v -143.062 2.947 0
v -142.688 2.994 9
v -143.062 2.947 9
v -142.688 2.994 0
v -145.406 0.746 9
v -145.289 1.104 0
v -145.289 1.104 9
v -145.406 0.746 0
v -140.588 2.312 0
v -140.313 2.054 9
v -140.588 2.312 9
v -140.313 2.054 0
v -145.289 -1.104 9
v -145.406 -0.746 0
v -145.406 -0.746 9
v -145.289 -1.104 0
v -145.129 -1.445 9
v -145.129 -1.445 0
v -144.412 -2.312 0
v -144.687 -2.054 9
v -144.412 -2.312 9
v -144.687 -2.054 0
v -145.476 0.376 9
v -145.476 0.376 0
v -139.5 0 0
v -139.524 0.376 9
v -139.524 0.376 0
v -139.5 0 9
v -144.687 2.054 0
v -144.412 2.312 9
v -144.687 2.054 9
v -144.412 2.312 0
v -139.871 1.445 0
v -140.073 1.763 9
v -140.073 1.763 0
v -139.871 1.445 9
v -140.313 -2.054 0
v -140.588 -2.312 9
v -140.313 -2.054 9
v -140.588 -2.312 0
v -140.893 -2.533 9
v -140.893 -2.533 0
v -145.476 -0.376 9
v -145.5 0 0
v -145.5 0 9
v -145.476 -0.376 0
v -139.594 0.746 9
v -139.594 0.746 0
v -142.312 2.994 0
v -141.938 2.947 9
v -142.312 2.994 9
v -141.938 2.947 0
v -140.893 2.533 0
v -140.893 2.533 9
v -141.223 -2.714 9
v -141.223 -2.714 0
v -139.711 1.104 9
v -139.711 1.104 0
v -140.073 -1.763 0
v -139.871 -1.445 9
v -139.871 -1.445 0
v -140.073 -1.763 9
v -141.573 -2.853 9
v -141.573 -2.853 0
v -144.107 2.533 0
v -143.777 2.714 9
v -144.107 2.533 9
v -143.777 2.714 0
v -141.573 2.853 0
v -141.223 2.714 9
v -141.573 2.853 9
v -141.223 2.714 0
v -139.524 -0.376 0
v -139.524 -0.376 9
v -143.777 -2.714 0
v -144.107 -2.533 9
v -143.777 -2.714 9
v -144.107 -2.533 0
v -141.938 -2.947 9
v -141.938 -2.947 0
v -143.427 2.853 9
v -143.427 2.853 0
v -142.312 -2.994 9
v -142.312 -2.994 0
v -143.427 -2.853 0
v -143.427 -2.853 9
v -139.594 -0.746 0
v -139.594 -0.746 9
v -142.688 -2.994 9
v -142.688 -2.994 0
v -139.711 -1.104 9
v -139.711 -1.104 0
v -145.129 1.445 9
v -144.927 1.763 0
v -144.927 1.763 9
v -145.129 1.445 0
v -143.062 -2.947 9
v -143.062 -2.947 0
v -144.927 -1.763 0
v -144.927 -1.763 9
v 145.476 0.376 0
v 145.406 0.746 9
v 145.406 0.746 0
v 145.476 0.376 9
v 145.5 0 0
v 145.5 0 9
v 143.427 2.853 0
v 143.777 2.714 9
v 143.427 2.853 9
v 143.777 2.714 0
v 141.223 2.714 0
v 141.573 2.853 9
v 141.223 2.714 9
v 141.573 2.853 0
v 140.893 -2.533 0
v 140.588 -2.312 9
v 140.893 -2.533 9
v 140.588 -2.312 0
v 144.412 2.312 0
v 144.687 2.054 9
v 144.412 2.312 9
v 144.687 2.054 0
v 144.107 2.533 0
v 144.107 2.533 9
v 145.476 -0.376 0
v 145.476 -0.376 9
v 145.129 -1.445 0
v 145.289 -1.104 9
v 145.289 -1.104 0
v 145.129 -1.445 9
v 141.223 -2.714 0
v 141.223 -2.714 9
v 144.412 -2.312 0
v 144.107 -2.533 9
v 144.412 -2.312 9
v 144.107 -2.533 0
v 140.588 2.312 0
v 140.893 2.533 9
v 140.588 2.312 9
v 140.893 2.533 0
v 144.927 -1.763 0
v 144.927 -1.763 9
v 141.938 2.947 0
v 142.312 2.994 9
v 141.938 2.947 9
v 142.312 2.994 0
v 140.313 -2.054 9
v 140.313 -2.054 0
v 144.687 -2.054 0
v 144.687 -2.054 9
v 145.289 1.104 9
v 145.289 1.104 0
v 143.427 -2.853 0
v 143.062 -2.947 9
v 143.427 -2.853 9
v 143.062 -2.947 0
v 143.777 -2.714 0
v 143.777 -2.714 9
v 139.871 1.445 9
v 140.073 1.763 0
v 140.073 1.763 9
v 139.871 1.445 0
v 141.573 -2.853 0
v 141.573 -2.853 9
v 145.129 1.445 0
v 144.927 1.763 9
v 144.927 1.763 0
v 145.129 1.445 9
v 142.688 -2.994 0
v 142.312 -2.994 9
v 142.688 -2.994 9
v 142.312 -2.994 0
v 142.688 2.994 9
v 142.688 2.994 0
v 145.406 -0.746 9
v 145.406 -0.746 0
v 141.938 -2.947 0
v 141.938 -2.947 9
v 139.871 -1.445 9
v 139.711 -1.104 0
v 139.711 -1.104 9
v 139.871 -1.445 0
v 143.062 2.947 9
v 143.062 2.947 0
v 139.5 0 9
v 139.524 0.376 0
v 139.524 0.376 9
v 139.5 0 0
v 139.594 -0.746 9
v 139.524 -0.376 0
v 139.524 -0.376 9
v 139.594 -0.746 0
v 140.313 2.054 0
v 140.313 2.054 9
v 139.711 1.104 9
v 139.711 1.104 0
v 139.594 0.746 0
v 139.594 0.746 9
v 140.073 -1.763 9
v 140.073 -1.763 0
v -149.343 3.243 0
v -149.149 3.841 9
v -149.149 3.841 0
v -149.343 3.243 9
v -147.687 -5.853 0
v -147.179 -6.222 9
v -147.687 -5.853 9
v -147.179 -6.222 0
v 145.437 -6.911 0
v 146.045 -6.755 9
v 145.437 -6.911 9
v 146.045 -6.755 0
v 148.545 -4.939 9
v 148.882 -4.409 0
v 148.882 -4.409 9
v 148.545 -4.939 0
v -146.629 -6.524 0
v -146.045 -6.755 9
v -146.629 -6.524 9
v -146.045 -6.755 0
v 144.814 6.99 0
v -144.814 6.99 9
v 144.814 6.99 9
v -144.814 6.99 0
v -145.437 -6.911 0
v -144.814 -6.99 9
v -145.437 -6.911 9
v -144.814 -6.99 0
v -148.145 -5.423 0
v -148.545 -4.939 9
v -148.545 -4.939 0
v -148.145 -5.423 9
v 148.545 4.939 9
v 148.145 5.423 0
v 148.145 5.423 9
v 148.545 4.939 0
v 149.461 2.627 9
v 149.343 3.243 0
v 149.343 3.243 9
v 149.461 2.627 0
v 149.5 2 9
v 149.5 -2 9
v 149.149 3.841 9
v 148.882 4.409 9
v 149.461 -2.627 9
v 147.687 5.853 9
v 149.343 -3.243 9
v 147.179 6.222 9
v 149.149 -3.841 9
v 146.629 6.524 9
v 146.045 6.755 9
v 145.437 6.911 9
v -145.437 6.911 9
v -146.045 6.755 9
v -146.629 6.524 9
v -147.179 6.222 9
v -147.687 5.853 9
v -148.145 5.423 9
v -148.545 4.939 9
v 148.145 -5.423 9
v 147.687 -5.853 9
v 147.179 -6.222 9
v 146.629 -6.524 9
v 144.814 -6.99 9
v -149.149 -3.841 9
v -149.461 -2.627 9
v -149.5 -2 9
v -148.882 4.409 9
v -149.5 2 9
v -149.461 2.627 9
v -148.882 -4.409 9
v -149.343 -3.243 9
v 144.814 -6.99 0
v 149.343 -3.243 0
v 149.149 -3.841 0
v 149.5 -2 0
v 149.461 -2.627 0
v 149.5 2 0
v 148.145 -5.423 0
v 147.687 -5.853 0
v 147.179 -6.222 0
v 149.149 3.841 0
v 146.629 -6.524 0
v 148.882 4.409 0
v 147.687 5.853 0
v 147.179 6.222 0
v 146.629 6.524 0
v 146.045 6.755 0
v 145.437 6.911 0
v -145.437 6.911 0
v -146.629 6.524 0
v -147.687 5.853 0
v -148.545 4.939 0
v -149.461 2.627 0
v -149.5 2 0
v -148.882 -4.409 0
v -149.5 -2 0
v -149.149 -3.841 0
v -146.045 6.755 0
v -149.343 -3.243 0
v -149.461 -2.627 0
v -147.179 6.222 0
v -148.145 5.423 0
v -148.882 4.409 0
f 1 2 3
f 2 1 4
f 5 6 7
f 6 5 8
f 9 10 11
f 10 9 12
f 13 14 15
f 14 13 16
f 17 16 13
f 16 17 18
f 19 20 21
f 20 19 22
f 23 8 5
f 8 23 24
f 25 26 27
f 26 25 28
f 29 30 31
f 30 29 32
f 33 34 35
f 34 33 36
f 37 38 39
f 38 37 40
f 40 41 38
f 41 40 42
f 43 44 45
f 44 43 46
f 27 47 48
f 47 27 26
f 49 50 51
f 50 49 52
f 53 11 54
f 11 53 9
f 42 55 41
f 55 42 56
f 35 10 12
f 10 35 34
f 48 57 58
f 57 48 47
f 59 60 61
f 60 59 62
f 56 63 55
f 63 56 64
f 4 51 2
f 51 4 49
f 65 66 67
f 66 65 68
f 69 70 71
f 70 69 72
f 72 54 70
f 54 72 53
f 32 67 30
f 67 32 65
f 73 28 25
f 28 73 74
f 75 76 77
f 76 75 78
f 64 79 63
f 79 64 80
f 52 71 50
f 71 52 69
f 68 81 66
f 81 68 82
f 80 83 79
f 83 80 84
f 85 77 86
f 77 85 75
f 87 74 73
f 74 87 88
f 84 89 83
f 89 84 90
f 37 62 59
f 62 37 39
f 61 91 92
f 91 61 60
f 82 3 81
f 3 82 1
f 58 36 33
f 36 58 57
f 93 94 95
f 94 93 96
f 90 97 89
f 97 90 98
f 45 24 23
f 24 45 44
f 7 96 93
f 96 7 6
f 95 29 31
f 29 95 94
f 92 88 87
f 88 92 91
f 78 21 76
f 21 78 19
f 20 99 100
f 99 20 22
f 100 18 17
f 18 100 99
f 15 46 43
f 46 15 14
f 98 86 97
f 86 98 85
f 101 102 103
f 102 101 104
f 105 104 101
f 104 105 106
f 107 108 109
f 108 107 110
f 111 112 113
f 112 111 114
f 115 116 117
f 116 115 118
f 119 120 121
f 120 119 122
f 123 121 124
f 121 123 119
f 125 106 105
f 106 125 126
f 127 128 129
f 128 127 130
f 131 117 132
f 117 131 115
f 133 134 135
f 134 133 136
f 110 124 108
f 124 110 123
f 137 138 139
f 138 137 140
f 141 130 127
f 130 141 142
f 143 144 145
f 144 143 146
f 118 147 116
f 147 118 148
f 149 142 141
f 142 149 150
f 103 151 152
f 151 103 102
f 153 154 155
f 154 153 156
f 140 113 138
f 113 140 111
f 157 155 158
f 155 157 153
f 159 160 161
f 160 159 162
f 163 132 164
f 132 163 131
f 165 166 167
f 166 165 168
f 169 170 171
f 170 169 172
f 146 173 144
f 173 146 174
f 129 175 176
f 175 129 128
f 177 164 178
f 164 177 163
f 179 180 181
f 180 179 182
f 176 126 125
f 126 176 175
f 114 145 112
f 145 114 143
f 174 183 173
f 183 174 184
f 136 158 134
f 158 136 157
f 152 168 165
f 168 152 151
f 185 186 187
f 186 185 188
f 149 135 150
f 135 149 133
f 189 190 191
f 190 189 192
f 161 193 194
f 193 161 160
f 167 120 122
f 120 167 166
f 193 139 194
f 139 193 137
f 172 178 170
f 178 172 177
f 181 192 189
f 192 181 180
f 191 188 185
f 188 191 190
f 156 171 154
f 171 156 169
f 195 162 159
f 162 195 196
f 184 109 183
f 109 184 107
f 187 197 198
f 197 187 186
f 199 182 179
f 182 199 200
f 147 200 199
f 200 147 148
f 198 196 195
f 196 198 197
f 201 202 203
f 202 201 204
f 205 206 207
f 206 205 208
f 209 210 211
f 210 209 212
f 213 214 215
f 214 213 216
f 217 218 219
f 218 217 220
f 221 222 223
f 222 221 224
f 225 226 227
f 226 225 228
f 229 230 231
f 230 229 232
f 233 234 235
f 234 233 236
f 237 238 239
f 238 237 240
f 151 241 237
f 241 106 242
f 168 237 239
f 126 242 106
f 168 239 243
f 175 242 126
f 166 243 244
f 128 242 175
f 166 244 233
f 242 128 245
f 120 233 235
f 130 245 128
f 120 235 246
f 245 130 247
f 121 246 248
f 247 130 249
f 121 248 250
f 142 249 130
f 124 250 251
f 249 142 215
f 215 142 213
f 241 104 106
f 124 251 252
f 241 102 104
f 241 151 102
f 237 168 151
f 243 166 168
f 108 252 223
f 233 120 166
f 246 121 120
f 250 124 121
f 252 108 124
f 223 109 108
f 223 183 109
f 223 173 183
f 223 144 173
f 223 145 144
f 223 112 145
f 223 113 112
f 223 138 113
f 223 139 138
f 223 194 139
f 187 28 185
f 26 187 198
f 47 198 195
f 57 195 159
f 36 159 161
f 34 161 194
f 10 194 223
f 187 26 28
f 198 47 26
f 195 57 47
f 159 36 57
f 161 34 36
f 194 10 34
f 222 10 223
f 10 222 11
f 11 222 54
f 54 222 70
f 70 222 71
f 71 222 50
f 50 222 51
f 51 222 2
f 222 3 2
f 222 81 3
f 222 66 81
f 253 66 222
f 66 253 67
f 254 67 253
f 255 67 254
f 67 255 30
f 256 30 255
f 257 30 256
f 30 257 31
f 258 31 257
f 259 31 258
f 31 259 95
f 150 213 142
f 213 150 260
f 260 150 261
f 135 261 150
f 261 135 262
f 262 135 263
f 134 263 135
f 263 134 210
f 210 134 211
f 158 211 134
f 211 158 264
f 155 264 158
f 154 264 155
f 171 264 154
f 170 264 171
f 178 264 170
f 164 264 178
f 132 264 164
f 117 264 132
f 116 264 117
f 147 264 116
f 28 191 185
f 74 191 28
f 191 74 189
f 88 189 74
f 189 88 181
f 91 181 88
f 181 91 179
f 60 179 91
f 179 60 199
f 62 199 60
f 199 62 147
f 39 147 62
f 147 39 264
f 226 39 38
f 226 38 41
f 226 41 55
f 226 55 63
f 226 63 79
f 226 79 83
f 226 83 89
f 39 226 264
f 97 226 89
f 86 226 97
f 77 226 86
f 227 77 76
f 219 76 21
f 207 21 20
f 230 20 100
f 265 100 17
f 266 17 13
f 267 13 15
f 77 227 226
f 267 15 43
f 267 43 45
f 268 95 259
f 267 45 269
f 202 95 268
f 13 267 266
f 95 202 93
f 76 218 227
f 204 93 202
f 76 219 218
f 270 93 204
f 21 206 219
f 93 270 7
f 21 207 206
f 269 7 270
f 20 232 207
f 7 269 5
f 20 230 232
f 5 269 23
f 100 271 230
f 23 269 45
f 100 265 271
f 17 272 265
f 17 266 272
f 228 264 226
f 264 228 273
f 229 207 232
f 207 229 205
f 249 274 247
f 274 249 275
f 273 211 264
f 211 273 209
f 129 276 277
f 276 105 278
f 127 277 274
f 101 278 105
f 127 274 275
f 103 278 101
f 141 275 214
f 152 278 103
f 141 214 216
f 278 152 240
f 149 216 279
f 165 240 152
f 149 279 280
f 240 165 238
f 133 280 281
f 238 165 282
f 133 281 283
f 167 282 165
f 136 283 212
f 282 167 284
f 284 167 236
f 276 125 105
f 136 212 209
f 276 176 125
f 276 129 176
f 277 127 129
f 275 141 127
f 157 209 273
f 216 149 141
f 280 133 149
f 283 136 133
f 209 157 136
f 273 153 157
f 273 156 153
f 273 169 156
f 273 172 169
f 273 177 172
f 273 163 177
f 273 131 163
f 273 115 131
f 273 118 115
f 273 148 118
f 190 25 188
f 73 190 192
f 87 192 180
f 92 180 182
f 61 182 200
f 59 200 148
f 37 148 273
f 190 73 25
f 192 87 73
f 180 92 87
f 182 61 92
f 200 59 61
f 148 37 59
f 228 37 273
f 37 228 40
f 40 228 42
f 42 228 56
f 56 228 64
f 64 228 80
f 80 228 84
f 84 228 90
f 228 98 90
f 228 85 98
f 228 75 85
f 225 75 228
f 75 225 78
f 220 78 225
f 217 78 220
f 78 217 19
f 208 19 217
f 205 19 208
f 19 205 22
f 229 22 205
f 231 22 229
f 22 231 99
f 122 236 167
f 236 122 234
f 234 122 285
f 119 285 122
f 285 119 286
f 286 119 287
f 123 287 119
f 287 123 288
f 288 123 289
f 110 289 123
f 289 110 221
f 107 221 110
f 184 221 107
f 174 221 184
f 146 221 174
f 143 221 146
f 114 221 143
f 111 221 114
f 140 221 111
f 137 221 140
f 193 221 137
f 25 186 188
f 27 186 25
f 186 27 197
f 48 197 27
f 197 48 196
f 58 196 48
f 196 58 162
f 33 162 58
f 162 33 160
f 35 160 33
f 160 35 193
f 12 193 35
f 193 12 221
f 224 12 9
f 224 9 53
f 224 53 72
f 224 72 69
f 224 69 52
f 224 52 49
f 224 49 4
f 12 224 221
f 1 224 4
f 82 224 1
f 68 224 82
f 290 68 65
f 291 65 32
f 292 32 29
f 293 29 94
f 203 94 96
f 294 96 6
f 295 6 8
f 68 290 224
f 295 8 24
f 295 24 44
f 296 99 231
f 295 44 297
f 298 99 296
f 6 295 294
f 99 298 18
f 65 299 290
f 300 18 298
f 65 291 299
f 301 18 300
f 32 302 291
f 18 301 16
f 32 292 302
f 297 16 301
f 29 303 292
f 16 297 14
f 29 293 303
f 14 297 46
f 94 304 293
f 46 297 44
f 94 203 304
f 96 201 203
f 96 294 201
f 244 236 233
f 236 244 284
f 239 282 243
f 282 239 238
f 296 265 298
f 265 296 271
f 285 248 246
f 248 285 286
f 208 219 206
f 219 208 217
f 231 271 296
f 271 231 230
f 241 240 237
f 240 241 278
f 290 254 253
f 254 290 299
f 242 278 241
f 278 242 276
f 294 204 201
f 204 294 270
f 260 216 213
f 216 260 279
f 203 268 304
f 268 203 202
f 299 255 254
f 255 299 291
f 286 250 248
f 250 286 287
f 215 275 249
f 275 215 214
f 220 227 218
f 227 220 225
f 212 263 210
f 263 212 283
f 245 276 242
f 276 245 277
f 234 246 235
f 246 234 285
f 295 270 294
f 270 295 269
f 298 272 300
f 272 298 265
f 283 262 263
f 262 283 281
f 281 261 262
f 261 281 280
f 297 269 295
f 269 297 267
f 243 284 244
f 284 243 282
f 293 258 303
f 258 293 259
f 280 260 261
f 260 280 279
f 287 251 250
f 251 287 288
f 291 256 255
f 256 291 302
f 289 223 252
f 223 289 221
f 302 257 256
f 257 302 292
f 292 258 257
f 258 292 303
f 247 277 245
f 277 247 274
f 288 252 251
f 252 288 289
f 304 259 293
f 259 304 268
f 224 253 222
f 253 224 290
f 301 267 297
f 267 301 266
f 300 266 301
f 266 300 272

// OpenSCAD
$fn = 50;


difference() {
	union() {
		hull() {
			translate(v = [-144.5000000000, 2.0000000000, 0]) {
				cylinder(h = 9, r = 5);
			}
			translate(v = [144.5000000000, 2.0000000000, 0]) {
				cylinder(h = 9, r = 5);
			}
			translate(v = [-144.5000000000, -2.0000000000, 0]) {
				cylinder(h = 9, r = 5);
			}
			translate(v = [144.5000000000, -2.0000000000, 0]) {
				cylinder(h = 9, r = 5);
			}
		}
	}
	union() {
		translate(v = [-142.5000000000, 0.0000000000, -100.0000000000]) {
			cylinder(h = 200, r = 3.0000000000);
		}
		translate(v = [-142.5000000000, 0.0000000000, -100.0000000000]) {
			cylinder(h = 200, r = 3.0000000000);
		}
		translate(v = [142.5000000000, 0.0000000000, -100.0000000000]) {
			cylinder(h = 200, r = 3.0000000000);
		}
		translate(v = [142.5000000000, 0.0000000000, -100.0000000000]) {
			cylinder(h = 200, r = 3.0000000000);
		}
	}
}
